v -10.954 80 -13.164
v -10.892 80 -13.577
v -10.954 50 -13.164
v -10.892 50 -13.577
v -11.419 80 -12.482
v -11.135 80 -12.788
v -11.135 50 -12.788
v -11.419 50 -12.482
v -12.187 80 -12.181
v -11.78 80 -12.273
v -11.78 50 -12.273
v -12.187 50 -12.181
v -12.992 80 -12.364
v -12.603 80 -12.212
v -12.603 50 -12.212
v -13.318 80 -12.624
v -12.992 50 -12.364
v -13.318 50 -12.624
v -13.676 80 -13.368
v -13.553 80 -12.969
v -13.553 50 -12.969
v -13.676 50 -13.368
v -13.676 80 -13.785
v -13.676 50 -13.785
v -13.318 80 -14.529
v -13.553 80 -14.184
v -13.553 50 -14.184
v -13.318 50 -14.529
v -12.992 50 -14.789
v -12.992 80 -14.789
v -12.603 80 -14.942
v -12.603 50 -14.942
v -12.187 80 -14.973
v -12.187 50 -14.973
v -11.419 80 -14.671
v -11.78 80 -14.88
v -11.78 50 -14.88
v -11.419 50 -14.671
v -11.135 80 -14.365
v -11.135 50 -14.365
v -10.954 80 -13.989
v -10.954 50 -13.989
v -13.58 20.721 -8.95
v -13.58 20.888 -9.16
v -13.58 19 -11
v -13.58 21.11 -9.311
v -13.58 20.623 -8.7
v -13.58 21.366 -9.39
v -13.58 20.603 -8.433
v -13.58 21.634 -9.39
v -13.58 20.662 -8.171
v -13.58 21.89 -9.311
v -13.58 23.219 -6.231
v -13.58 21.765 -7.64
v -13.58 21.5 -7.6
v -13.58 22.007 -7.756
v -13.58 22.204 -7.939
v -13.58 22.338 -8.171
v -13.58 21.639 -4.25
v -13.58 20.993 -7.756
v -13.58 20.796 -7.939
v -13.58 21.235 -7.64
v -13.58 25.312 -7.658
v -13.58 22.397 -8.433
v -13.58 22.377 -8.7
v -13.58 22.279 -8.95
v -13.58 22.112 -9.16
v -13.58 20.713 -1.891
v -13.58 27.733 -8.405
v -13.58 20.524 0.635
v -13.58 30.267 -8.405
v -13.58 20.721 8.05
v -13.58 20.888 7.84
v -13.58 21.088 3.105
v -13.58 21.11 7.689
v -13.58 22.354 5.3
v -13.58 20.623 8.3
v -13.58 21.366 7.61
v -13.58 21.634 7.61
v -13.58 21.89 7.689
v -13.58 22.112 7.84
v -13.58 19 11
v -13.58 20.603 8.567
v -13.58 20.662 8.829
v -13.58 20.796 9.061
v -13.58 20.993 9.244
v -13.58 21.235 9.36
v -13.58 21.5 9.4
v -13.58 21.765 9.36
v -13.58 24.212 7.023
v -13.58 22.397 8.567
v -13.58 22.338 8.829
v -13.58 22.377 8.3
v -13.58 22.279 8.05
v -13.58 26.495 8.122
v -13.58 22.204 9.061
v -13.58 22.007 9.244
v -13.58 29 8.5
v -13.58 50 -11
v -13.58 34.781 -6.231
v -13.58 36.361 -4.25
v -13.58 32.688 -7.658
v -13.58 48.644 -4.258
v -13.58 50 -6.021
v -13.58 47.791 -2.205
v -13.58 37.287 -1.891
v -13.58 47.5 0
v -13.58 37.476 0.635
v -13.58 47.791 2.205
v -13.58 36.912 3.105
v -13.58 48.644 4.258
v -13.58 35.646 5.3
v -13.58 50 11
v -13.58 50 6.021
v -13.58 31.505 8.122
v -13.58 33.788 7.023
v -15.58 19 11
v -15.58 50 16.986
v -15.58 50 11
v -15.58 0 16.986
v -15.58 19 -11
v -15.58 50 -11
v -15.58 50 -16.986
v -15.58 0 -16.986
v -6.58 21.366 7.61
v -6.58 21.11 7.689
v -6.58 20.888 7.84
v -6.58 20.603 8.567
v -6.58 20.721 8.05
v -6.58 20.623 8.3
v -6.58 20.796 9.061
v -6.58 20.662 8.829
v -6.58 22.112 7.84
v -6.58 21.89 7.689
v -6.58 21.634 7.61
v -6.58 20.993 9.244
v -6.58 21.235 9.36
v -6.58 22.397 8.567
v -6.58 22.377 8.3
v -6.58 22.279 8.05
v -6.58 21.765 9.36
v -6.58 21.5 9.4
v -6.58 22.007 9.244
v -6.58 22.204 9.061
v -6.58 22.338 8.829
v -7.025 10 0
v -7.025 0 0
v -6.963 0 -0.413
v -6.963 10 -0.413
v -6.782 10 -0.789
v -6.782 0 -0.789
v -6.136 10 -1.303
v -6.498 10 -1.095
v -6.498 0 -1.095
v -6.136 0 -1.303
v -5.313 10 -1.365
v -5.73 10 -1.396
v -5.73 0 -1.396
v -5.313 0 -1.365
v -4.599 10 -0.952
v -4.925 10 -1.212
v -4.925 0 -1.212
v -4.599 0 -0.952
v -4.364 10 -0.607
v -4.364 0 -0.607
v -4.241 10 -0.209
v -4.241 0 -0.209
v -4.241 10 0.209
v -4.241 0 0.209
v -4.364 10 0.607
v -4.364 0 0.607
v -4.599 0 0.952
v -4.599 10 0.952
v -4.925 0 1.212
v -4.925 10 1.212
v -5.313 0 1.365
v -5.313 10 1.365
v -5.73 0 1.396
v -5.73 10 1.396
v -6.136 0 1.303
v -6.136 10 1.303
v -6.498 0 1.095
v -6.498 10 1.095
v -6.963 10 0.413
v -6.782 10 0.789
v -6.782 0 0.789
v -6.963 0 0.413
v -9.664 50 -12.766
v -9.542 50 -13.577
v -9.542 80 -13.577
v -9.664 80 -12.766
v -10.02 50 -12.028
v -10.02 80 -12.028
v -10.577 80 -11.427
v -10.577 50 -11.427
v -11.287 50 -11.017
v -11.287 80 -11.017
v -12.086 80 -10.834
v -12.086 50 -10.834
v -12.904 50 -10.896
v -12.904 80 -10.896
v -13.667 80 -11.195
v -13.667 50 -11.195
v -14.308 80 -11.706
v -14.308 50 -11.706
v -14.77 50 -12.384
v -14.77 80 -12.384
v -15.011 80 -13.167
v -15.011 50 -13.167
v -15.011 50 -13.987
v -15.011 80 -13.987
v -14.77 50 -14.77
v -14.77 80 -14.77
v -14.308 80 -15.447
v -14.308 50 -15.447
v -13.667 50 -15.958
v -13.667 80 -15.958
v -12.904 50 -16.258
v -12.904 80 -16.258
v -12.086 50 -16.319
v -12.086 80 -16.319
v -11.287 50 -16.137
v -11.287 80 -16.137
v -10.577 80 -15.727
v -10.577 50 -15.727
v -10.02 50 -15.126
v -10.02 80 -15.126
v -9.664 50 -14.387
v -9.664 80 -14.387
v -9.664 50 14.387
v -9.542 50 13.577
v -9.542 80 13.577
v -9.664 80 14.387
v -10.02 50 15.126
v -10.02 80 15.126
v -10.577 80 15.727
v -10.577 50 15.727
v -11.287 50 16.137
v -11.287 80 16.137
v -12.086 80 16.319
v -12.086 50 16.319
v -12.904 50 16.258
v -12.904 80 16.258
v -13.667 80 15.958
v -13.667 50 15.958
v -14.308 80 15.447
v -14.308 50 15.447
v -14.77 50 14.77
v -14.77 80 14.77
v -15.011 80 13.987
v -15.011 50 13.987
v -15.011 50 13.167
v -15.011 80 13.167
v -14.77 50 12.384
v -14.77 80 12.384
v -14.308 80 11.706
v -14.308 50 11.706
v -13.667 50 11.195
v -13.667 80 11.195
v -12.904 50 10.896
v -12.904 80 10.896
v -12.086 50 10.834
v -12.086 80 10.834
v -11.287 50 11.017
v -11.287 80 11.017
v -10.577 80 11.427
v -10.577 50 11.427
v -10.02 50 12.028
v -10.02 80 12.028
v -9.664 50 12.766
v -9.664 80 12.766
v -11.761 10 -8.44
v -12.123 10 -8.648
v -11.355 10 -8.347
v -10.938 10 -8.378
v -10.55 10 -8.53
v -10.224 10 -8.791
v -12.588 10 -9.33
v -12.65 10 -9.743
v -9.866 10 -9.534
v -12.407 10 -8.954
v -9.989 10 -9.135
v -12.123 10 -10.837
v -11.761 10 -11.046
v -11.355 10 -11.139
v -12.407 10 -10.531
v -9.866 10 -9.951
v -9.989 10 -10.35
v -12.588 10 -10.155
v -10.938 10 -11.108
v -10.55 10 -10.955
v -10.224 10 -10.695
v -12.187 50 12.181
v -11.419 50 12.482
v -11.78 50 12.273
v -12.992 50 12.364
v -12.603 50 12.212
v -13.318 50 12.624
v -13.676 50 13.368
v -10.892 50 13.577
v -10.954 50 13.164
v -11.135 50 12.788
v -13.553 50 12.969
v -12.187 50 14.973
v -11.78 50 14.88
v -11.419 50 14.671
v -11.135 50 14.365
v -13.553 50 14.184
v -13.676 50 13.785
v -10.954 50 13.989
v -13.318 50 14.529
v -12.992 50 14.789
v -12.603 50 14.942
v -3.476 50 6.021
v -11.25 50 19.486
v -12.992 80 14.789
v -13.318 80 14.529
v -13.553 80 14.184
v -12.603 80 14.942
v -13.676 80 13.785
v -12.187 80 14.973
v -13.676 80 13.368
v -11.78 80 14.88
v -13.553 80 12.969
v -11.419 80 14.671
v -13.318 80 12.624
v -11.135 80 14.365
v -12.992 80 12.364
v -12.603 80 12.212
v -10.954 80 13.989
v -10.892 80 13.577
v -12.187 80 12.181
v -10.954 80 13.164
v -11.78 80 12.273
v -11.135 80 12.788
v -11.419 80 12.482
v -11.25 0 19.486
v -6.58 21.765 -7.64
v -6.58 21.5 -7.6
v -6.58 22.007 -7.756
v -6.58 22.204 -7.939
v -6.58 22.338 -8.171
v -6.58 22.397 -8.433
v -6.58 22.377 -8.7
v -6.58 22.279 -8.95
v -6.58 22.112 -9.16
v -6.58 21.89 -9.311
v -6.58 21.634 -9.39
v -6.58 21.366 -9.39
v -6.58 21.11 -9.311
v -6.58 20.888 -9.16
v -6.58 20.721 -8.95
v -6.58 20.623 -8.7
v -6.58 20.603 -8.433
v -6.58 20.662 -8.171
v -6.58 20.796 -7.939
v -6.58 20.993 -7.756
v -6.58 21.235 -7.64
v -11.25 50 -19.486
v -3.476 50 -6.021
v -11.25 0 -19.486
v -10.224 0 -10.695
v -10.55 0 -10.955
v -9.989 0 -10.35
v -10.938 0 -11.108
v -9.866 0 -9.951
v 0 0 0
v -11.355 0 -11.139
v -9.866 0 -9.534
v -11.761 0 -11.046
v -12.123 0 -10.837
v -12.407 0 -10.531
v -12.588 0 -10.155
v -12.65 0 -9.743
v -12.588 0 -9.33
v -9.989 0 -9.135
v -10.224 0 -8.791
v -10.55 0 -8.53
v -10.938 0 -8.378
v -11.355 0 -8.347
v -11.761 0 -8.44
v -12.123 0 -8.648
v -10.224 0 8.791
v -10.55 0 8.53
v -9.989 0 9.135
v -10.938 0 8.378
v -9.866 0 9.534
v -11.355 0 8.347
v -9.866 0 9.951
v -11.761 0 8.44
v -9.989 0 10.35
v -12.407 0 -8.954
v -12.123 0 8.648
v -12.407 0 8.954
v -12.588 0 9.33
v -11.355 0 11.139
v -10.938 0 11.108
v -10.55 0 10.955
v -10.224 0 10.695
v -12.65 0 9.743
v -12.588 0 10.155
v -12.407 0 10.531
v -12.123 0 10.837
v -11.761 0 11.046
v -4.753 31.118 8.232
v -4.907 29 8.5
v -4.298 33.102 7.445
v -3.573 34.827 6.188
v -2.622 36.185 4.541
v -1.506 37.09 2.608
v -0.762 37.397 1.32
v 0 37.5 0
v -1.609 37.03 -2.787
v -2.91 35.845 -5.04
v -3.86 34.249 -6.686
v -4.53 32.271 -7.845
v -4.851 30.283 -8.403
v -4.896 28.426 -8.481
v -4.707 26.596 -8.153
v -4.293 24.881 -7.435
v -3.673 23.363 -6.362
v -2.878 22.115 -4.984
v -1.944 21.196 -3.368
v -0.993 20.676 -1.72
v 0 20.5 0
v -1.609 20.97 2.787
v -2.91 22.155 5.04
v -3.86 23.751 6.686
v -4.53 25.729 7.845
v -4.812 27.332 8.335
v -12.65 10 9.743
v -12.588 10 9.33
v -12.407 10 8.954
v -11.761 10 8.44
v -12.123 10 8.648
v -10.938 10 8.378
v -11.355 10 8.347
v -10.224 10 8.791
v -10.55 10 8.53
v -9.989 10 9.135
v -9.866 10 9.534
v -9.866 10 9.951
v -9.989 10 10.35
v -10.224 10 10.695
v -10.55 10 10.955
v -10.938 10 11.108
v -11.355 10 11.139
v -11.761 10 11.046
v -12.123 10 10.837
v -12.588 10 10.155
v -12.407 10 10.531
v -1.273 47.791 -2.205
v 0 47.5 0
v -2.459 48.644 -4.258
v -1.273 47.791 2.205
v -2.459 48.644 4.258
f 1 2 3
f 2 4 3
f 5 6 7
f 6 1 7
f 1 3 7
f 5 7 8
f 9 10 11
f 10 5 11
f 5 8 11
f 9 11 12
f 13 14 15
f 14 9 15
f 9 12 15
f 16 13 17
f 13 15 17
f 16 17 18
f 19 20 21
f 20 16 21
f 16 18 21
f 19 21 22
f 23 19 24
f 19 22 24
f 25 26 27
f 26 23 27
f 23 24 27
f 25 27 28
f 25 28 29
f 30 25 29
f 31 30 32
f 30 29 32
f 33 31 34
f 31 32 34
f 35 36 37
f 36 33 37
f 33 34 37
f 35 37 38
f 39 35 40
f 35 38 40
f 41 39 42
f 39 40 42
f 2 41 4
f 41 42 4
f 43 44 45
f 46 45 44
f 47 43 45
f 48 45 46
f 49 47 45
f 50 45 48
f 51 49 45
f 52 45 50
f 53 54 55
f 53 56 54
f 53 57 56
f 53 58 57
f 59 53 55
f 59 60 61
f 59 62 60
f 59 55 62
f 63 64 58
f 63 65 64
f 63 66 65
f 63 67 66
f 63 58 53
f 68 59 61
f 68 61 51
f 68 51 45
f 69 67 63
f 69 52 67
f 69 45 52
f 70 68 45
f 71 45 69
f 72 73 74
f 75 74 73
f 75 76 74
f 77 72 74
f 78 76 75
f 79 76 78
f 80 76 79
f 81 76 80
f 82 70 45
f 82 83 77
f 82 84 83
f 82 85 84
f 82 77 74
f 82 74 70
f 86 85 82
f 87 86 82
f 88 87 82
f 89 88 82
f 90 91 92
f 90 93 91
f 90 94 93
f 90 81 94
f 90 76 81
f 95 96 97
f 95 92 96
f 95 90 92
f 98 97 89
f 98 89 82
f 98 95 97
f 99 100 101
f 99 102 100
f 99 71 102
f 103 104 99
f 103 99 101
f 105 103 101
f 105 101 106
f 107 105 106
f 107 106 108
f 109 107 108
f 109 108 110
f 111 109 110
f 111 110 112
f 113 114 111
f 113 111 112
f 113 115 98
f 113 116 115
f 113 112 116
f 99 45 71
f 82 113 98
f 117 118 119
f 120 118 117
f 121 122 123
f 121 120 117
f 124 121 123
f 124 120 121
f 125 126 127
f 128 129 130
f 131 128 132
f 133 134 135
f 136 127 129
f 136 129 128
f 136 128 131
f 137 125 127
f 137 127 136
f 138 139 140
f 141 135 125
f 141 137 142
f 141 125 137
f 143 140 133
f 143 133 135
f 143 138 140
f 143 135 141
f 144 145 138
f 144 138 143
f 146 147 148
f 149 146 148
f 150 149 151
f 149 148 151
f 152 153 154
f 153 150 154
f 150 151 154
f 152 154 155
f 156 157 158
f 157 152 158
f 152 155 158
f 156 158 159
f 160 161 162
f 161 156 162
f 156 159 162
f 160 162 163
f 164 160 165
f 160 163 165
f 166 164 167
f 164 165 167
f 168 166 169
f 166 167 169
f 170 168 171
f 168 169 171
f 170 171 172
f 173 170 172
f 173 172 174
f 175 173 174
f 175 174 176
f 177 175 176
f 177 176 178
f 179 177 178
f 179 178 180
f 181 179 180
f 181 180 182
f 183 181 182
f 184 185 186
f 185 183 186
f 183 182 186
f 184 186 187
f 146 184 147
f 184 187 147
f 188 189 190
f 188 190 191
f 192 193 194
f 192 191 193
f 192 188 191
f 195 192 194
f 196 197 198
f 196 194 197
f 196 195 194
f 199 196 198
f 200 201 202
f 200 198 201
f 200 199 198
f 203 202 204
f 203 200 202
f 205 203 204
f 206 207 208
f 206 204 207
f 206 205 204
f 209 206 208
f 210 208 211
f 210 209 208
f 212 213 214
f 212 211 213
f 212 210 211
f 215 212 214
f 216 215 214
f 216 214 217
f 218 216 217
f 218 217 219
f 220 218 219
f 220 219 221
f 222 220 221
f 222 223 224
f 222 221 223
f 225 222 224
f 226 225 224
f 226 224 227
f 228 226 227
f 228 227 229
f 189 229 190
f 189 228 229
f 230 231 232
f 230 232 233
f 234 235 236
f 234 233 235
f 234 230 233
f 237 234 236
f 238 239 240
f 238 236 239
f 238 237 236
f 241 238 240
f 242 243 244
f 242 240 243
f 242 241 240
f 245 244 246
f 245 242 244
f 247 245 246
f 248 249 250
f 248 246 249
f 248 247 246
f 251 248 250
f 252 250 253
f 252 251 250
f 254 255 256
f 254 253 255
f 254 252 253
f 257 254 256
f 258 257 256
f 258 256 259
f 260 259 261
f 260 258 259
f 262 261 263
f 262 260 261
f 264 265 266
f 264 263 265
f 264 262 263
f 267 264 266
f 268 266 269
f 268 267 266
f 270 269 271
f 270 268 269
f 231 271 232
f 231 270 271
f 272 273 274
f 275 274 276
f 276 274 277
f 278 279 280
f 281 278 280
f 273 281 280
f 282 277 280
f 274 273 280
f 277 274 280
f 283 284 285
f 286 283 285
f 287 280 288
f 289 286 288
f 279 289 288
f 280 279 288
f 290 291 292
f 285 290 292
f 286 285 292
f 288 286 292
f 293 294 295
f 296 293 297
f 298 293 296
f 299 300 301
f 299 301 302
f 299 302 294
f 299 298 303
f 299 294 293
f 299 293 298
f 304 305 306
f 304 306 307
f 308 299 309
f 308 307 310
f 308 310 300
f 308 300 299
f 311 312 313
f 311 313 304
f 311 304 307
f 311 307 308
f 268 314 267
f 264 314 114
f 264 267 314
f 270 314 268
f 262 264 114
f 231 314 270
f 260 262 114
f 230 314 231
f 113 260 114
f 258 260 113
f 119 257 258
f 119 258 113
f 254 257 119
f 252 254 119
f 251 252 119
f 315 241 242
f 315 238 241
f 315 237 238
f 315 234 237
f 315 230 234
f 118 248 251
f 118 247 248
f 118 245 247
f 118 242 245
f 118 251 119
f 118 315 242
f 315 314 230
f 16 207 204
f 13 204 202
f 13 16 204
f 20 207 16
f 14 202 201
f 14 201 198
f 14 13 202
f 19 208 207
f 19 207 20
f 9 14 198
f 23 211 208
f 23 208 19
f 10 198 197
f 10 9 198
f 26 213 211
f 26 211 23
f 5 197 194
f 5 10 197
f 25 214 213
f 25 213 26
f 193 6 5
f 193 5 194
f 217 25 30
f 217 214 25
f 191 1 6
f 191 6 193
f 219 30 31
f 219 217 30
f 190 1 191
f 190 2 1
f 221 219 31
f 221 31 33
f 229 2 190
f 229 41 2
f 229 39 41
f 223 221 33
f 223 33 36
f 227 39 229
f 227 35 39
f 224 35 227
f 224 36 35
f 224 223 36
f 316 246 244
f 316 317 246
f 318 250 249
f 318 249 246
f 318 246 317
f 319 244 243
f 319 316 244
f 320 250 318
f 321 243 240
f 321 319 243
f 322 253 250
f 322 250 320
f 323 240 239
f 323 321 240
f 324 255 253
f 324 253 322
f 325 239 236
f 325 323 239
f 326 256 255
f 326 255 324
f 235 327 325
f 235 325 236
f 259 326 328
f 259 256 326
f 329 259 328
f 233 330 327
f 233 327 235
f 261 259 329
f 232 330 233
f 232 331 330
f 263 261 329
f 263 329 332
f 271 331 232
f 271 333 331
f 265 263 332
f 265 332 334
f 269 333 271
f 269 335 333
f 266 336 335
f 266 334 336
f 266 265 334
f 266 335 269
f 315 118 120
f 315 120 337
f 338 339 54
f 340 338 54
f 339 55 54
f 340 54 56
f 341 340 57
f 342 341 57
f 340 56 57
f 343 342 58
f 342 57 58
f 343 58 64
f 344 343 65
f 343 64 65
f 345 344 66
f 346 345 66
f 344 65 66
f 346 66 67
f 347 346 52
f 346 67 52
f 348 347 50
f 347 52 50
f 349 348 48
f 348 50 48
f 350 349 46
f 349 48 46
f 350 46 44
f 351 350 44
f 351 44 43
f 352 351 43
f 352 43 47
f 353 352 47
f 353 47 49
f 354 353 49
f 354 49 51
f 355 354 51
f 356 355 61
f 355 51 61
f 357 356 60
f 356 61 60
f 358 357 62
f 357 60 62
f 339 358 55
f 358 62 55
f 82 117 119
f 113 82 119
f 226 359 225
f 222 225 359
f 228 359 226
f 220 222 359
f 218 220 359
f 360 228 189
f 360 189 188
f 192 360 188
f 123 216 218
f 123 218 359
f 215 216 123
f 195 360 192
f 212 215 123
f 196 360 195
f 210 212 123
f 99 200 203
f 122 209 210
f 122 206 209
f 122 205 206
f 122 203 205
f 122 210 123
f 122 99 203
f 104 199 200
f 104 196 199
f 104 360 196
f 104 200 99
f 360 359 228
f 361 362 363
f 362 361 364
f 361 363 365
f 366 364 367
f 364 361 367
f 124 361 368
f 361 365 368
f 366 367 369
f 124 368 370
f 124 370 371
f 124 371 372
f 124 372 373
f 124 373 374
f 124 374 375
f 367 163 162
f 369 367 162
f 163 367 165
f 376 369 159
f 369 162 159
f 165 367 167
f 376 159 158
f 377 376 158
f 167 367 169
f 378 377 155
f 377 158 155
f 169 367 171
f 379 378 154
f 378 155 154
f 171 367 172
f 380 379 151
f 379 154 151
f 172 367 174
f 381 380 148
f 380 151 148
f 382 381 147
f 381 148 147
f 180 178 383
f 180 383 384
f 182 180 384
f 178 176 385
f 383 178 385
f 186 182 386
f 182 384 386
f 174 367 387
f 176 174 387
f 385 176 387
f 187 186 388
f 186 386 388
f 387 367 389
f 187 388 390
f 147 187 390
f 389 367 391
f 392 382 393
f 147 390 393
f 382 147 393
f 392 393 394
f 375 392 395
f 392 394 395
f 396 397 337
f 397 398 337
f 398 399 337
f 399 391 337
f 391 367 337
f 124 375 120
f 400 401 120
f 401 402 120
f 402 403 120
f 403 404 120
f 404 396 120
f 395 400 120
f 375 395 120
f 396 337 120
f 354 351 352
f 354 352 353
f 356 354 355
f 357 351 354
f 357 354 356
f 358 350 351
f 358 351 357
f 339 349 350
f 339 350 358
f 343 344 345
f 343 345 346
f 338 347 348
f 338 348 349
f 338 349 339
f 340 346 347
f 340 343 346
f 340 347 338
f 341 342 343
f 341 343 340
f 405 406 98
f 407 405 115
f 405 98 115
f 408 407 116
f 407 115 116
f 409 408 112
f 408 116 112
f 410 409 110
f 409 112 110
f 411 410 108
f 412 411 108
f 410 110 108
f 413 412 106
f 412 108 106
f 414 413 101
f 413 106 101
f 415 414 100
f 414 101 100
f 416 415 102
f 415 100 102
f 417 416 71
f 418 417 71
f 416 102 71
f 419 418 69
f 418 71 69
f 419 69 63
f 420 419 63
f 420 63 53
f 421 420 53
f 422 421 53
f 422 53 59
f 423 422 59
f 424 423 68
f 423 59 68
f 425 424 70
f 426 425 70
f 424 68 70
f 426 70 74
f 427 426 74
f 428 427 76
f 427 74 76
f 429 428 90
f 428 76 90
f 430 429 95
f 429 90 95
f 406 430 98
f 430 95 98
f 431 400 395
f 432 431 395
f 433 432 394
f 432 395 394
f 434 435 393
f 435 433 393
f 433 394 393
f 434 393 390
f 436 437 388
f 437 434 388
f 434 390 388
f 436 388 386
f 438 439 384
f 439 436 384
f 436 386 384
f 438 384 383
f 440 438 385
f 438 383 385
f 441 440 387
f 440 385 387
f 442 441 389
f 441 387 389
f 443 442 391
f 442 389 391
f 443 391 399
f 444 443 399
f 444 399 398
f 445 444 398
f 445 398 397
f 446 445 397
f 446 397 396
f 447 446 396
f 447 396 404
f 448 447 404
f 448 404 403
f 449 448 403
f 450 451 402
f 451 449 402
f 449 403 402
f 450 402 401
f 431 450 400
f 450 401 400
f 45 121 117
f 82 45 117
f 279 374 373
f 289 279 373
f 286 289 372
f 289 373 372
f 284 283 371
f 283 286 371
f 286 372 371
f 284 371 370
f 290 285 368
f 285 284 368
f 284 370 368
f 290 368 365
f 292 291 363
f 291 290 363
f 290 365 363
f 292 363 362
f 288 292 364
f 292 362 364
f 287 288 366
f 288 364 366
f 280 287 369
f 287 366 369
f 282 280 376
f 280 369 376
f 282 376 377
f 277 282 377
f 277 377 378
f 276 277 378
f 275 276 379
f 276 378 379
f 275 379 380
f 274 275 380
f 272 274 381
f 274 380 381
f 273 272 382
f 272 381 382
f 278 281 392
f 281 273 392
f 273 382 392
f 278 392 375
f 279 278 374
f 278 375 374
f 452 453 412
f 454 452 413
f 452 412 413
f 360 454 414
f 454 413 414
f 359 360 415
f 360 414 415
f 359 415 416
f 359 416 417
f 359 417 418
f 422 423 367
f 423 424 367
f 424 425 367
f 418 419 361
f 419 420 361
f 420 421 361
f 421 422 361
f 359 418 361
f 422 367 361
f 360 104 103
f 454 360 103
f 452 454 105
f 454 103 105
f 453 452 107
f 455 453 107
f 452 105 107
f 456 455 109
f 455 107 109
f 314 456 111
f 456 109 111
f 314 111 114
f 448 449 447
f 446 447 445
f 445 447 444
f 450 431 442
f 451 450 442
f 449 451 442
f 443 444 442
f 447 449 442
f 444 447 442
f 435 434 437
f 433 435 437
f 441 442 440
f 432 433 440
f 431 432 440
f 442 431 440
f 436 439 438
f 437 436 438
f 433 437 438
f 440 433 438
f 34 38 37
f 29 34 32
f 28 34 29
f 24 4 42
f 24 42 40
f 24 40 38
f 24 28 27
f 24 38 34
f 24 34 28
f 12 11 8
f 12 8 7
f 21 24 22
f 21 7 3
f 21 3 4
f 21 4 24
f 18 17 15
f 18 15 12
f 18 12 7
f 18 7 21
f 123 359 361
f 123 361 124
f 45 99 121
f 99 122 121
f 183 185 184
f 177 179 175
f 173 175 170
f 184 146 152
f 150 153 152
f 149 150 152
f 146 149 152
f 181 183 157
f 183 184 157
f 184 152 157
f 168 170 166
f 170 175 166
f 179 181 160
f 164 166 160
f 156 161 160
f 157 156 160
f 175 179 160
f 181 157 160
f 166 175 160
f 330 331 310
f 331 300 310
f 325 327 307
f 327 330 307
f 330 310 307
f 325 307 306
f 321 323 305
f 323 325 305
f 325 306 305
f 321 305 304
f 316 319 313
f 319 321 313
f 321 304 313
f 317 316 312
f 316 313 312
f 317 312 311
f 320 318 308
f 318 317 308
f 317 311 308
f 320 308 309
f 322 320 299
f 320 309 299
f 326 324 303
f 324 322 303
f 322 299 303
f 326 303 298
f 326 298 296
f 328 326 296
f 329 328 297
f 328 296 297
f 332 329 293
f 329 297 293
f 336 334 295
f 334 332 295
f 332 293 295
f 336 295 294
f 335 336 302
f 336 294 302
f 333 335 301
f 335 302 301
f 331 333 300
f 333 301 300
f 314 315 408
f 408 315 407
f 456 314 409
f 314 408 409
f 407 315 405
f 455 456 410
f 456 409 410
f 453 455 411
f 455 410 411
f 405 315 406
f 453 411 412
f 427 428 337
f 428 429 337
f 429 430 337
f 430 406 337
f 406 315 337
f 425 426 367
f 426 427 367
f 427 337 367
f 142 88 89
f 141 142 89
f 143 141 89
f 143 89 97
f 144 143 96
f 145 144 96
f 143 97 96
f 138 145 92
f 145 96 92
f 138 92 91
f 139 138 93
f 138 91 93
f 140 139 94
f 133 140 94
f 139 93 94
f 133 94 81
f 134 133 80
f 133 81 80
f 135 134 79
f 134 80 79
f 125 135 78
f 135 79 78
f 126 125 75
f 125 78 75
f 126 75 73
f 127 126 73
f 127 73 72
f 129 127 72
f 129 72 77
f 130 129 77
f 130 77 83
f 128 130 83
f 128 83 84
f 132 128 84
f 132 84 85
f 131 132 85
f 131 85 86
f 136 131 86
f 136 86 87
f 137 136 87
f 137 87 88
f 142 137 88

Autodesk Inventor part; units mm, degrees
ref_plane "YZ Plane" through (0, 0, 0) normal (1, 0, 0) x (0, 1, 0)
ref_plane "XZ Plane" through (0, 0, 0) normal (0, 1, 0) x (-1, 0, 0)
ref_plane "XY Plane" through (0, 0, 0) normal (0, 0, 1) x (1, 0, 0)
sketch "Sketch1" plane through (0, 0, 0) normal (0, 1, 0) x (-1, 0, 0)
  line L0 (15.5801, 16.9856) -> (11.25, 19.4856)
  line L1 (11.25, -19.4856) -> (15.5801, -16.9856)
  line L2 (11.25, 19.4856) -> (0, 0)
  line L3 (0, 0) -> (11.25, -19.4856)
  line L4 (15.5801, 16.9856) -> (15.5801, -16.9856)
  circle A0 centre (5.625, 0) radius 1.4
  circle A1 centre (11.25, -9.7428) radius 1.4
  circle A2 centre (11.25, 9.7428) radius 1.4
  dimension "d4" = 2.8
  dimension "d5" = 2.8
  dimension "d6" = 2.8
extrude "Extrusion1" add sketch "Sketch1" along normal blind 50
sketch "Sketch3" plane through (0, 50, 0) normal (0, 1, 0) x (1, 0, 0)
  circle A0 centre (-11.25, -9.7428) radius 1.4 projected
  circle A1 centre (-11.25, 9.7428) radius 1.4 projected
  circle A2 centre (-5.625, 0) radius 1.4 projected
  line L0 (-15.5801, -16.9856) -> (-11.25, -19.4856) projected
  line L1 (-11.25, -19.4856) -> (0, 0) projected
  line L2 (0, 0) -> (-11.25, 19.4856) projected
  line L3 (-11.25, 19.4856) -> (-15.5801, 16.9856) projected
  line L4 (-15.5801, 16.9856) -> (-15.5801, -16.9856) projected
  line L5 (-11.25, 0) -> (-15.5801, 16.9856)
  line L6 (-11.25, 0) -> (-15.5801, -16.9856)
  dimension "d15" = 5.625
extrude "Extrusion3" add sketch "Sketch3" against normal blind 40 contours A0 | A1 | A2 | L4 L5 L6
sketch "Sketch4" plane through (0, 50, 0) normal (0, 1, 0) x (1, 0, 0)
  line L0 (-11.25, -19.4856) -> (-5.25, -19.4856) construction
  circle A0 centre (-12.2919, -13.5767) radius 1.4
  line L1 (0, 0) -> (-15.5801, 0)
  line L2 (-15.5801, 16.9856) -> (-15.5801, -16.9856) projected
  circle A1 centre (-12.2919, 13.5767) radius 1.4
  circle A2 centre (-12.2919, 13.5767) radius 2.75
  circle A3 centre (-12.2919, -13.5767) radius 2.75
  point P0 (-11.25, 19.4856)
  dimension "d12" = 2.8
  dimension "d78" = 5.5
  dimension "d79" = 5.5
extrude "Extrusion4" add sketch "Sketch4" along normal blind 30
sketch "Sketch6" plane through (-15.5801, 0, -16.9856) normal (-1, 0, 0) x (0, 0, 1)
  line L0 (16.9856, 15) -> (16.9856, 20)
  line L1 (16.9856, 50) -> (16.9856, 23) projected
  line L2 (16.9856, 20) -> (6.9856, 20)
  line L3 (26.9856, 20) -> (16.9856, 20)
  line L4 (6.9856, 20) -> (8.4856, 20)
  line L5 (8.4856, 20) -> (8.4856, 21.5)
  line L6 (26.9856, 20) -> (25.4856, 20)
  line L7 (25.4856, 20) -> (25.4856, 21.5)
  circle A0 centre (25.4856, 21.5) radius 0.6
  circle A1 centre (8.4856, 21.5) radius 0.6
  line L8 (16.9856, 20) -> (16.9856, 29)
  circle A2 centre (16.9856, 29) radius 8.5
  line L9 (16.9856, 29) -> (16.9856, 56)
  circle A3 centre (16.9856, 56) radius 8.5
  line L10 (26.9856, 20) -> (26.9856, 65)
  line L11 (26.9856, 65) -> (6.9856, 65)
  line L12 (6.9856, 65) -> (6.9856, 20)
  point P0 (16.9856, 0)
  dimension "d23" = 5
  dimension "d24" = 10
  dimension "d28" = 1.5
  dimension "d29" = 1.5
  dimension "d30" = 1.5
  dimension "d31" = 1.5
  dimension "d32" = 1.2
  dimension "d33" = 1.2
  dimension "d34" = 9
  dimension "d35" = 17
  dimension "d36" = 27
  dimension "d37" = 17
  dimension "d38" = 45
  dimension "d39" = 20
extrude "Extrusion6" cut sketch "Sketch6" against normal through all contours L1 A2 L8 | L1 L8 A2 | A3
sketch "Sketch7" plane through (-15.5801, 0, -16.9856) normal (-1, 0, 0) x (0, 0, 1)
  line L0 (16.9856, 15) -> (16.9856, 20)
  line L1 (16.9856, 50) -> (16.9856, 15)
  line L2 (16.9856, 20) -> (6.9856, 20)
  line L3 (26.9856, 20) -> (16.9856, 20)
  line L4 (6.9856, 20) -> (8.4856, 20)
  line L5 (8.4856, 20) -> (8.4856, 21.5)
  line L6 (26.9856, 20) -> (25.4856, 20)
  line L7 (25.4856, 20) -> (25.4856, 21.5)
  circle A0 centre (25.4856, 21.5) radius 0.9
  circle A1 centre (8.4856, 21.5) radius 0.9
  line L8 (16.9856, 20) -> (16.9856, 29)
  circle A2 centre (16.9856, 29) radius 8.5
  line L9 (16.9856, 29) -> (16.9856, 56)
  circle A3 centre (16.9856, 56) radius 8.5
  line L10 (26.9856, 20) -> (26.9856, 65)
  line L11 (26.9856, 65) -> (6.9856, 65)
  line L12 (6.9856, 65) -> (6.9856, 20)
  point P0 (16.9856, 0)
  point P1 (16.9856, 0)
  dimension "d42" = 5
  dimension "d43" = 10
  dimension "d44" = 1.5
  dimension "d45" = 1.5
  dimension "d46" = 1.5
  dimension "d47" = 1.5
  dimension "d48" = 1.8
  dimension "d49" = 1.8
  dimension "d50" = 9
  dimension "d51" = 17
  dimension "d52" = 27
  dimension "d53" = 17
  dimension "d54" = 45
  dimension "d55" = 20
extrude "Extrusion7" cut sketch "Sketch7" against normal blind 9 contours A0 | A1
sketch "Sketch8" plane through (-15.5801, 0, -16.9856) normal (-1, 0, 0) x (0, 0, 1)
  line L0 (5.9856, 20) -> (5.9856, 19)
  line L1 (28.0623, 50) -> (28.0623, 80) projected
  line L2 (26.9856, 66) -> (27.9856, 66)
  line L3 (27.9856, 66) -> (5.9856, 66)
  line L4 (5.9856, 66) -> (5.9856, 19)
  line L5 (5.9856, 19) -> (27.9856, 19)
  line L6 (27.9856, 19) -> (27.9856, 66)
  point P0 (16.9856, 0)
  point P1 (16.9856, 15)
  dimension "d73" = 1
  dimension "d75" = 1
extrude "Extrusion8" cut sketch "Sketch8" against normal blind 2
properties part number "Support" material "ABS Plastic"
